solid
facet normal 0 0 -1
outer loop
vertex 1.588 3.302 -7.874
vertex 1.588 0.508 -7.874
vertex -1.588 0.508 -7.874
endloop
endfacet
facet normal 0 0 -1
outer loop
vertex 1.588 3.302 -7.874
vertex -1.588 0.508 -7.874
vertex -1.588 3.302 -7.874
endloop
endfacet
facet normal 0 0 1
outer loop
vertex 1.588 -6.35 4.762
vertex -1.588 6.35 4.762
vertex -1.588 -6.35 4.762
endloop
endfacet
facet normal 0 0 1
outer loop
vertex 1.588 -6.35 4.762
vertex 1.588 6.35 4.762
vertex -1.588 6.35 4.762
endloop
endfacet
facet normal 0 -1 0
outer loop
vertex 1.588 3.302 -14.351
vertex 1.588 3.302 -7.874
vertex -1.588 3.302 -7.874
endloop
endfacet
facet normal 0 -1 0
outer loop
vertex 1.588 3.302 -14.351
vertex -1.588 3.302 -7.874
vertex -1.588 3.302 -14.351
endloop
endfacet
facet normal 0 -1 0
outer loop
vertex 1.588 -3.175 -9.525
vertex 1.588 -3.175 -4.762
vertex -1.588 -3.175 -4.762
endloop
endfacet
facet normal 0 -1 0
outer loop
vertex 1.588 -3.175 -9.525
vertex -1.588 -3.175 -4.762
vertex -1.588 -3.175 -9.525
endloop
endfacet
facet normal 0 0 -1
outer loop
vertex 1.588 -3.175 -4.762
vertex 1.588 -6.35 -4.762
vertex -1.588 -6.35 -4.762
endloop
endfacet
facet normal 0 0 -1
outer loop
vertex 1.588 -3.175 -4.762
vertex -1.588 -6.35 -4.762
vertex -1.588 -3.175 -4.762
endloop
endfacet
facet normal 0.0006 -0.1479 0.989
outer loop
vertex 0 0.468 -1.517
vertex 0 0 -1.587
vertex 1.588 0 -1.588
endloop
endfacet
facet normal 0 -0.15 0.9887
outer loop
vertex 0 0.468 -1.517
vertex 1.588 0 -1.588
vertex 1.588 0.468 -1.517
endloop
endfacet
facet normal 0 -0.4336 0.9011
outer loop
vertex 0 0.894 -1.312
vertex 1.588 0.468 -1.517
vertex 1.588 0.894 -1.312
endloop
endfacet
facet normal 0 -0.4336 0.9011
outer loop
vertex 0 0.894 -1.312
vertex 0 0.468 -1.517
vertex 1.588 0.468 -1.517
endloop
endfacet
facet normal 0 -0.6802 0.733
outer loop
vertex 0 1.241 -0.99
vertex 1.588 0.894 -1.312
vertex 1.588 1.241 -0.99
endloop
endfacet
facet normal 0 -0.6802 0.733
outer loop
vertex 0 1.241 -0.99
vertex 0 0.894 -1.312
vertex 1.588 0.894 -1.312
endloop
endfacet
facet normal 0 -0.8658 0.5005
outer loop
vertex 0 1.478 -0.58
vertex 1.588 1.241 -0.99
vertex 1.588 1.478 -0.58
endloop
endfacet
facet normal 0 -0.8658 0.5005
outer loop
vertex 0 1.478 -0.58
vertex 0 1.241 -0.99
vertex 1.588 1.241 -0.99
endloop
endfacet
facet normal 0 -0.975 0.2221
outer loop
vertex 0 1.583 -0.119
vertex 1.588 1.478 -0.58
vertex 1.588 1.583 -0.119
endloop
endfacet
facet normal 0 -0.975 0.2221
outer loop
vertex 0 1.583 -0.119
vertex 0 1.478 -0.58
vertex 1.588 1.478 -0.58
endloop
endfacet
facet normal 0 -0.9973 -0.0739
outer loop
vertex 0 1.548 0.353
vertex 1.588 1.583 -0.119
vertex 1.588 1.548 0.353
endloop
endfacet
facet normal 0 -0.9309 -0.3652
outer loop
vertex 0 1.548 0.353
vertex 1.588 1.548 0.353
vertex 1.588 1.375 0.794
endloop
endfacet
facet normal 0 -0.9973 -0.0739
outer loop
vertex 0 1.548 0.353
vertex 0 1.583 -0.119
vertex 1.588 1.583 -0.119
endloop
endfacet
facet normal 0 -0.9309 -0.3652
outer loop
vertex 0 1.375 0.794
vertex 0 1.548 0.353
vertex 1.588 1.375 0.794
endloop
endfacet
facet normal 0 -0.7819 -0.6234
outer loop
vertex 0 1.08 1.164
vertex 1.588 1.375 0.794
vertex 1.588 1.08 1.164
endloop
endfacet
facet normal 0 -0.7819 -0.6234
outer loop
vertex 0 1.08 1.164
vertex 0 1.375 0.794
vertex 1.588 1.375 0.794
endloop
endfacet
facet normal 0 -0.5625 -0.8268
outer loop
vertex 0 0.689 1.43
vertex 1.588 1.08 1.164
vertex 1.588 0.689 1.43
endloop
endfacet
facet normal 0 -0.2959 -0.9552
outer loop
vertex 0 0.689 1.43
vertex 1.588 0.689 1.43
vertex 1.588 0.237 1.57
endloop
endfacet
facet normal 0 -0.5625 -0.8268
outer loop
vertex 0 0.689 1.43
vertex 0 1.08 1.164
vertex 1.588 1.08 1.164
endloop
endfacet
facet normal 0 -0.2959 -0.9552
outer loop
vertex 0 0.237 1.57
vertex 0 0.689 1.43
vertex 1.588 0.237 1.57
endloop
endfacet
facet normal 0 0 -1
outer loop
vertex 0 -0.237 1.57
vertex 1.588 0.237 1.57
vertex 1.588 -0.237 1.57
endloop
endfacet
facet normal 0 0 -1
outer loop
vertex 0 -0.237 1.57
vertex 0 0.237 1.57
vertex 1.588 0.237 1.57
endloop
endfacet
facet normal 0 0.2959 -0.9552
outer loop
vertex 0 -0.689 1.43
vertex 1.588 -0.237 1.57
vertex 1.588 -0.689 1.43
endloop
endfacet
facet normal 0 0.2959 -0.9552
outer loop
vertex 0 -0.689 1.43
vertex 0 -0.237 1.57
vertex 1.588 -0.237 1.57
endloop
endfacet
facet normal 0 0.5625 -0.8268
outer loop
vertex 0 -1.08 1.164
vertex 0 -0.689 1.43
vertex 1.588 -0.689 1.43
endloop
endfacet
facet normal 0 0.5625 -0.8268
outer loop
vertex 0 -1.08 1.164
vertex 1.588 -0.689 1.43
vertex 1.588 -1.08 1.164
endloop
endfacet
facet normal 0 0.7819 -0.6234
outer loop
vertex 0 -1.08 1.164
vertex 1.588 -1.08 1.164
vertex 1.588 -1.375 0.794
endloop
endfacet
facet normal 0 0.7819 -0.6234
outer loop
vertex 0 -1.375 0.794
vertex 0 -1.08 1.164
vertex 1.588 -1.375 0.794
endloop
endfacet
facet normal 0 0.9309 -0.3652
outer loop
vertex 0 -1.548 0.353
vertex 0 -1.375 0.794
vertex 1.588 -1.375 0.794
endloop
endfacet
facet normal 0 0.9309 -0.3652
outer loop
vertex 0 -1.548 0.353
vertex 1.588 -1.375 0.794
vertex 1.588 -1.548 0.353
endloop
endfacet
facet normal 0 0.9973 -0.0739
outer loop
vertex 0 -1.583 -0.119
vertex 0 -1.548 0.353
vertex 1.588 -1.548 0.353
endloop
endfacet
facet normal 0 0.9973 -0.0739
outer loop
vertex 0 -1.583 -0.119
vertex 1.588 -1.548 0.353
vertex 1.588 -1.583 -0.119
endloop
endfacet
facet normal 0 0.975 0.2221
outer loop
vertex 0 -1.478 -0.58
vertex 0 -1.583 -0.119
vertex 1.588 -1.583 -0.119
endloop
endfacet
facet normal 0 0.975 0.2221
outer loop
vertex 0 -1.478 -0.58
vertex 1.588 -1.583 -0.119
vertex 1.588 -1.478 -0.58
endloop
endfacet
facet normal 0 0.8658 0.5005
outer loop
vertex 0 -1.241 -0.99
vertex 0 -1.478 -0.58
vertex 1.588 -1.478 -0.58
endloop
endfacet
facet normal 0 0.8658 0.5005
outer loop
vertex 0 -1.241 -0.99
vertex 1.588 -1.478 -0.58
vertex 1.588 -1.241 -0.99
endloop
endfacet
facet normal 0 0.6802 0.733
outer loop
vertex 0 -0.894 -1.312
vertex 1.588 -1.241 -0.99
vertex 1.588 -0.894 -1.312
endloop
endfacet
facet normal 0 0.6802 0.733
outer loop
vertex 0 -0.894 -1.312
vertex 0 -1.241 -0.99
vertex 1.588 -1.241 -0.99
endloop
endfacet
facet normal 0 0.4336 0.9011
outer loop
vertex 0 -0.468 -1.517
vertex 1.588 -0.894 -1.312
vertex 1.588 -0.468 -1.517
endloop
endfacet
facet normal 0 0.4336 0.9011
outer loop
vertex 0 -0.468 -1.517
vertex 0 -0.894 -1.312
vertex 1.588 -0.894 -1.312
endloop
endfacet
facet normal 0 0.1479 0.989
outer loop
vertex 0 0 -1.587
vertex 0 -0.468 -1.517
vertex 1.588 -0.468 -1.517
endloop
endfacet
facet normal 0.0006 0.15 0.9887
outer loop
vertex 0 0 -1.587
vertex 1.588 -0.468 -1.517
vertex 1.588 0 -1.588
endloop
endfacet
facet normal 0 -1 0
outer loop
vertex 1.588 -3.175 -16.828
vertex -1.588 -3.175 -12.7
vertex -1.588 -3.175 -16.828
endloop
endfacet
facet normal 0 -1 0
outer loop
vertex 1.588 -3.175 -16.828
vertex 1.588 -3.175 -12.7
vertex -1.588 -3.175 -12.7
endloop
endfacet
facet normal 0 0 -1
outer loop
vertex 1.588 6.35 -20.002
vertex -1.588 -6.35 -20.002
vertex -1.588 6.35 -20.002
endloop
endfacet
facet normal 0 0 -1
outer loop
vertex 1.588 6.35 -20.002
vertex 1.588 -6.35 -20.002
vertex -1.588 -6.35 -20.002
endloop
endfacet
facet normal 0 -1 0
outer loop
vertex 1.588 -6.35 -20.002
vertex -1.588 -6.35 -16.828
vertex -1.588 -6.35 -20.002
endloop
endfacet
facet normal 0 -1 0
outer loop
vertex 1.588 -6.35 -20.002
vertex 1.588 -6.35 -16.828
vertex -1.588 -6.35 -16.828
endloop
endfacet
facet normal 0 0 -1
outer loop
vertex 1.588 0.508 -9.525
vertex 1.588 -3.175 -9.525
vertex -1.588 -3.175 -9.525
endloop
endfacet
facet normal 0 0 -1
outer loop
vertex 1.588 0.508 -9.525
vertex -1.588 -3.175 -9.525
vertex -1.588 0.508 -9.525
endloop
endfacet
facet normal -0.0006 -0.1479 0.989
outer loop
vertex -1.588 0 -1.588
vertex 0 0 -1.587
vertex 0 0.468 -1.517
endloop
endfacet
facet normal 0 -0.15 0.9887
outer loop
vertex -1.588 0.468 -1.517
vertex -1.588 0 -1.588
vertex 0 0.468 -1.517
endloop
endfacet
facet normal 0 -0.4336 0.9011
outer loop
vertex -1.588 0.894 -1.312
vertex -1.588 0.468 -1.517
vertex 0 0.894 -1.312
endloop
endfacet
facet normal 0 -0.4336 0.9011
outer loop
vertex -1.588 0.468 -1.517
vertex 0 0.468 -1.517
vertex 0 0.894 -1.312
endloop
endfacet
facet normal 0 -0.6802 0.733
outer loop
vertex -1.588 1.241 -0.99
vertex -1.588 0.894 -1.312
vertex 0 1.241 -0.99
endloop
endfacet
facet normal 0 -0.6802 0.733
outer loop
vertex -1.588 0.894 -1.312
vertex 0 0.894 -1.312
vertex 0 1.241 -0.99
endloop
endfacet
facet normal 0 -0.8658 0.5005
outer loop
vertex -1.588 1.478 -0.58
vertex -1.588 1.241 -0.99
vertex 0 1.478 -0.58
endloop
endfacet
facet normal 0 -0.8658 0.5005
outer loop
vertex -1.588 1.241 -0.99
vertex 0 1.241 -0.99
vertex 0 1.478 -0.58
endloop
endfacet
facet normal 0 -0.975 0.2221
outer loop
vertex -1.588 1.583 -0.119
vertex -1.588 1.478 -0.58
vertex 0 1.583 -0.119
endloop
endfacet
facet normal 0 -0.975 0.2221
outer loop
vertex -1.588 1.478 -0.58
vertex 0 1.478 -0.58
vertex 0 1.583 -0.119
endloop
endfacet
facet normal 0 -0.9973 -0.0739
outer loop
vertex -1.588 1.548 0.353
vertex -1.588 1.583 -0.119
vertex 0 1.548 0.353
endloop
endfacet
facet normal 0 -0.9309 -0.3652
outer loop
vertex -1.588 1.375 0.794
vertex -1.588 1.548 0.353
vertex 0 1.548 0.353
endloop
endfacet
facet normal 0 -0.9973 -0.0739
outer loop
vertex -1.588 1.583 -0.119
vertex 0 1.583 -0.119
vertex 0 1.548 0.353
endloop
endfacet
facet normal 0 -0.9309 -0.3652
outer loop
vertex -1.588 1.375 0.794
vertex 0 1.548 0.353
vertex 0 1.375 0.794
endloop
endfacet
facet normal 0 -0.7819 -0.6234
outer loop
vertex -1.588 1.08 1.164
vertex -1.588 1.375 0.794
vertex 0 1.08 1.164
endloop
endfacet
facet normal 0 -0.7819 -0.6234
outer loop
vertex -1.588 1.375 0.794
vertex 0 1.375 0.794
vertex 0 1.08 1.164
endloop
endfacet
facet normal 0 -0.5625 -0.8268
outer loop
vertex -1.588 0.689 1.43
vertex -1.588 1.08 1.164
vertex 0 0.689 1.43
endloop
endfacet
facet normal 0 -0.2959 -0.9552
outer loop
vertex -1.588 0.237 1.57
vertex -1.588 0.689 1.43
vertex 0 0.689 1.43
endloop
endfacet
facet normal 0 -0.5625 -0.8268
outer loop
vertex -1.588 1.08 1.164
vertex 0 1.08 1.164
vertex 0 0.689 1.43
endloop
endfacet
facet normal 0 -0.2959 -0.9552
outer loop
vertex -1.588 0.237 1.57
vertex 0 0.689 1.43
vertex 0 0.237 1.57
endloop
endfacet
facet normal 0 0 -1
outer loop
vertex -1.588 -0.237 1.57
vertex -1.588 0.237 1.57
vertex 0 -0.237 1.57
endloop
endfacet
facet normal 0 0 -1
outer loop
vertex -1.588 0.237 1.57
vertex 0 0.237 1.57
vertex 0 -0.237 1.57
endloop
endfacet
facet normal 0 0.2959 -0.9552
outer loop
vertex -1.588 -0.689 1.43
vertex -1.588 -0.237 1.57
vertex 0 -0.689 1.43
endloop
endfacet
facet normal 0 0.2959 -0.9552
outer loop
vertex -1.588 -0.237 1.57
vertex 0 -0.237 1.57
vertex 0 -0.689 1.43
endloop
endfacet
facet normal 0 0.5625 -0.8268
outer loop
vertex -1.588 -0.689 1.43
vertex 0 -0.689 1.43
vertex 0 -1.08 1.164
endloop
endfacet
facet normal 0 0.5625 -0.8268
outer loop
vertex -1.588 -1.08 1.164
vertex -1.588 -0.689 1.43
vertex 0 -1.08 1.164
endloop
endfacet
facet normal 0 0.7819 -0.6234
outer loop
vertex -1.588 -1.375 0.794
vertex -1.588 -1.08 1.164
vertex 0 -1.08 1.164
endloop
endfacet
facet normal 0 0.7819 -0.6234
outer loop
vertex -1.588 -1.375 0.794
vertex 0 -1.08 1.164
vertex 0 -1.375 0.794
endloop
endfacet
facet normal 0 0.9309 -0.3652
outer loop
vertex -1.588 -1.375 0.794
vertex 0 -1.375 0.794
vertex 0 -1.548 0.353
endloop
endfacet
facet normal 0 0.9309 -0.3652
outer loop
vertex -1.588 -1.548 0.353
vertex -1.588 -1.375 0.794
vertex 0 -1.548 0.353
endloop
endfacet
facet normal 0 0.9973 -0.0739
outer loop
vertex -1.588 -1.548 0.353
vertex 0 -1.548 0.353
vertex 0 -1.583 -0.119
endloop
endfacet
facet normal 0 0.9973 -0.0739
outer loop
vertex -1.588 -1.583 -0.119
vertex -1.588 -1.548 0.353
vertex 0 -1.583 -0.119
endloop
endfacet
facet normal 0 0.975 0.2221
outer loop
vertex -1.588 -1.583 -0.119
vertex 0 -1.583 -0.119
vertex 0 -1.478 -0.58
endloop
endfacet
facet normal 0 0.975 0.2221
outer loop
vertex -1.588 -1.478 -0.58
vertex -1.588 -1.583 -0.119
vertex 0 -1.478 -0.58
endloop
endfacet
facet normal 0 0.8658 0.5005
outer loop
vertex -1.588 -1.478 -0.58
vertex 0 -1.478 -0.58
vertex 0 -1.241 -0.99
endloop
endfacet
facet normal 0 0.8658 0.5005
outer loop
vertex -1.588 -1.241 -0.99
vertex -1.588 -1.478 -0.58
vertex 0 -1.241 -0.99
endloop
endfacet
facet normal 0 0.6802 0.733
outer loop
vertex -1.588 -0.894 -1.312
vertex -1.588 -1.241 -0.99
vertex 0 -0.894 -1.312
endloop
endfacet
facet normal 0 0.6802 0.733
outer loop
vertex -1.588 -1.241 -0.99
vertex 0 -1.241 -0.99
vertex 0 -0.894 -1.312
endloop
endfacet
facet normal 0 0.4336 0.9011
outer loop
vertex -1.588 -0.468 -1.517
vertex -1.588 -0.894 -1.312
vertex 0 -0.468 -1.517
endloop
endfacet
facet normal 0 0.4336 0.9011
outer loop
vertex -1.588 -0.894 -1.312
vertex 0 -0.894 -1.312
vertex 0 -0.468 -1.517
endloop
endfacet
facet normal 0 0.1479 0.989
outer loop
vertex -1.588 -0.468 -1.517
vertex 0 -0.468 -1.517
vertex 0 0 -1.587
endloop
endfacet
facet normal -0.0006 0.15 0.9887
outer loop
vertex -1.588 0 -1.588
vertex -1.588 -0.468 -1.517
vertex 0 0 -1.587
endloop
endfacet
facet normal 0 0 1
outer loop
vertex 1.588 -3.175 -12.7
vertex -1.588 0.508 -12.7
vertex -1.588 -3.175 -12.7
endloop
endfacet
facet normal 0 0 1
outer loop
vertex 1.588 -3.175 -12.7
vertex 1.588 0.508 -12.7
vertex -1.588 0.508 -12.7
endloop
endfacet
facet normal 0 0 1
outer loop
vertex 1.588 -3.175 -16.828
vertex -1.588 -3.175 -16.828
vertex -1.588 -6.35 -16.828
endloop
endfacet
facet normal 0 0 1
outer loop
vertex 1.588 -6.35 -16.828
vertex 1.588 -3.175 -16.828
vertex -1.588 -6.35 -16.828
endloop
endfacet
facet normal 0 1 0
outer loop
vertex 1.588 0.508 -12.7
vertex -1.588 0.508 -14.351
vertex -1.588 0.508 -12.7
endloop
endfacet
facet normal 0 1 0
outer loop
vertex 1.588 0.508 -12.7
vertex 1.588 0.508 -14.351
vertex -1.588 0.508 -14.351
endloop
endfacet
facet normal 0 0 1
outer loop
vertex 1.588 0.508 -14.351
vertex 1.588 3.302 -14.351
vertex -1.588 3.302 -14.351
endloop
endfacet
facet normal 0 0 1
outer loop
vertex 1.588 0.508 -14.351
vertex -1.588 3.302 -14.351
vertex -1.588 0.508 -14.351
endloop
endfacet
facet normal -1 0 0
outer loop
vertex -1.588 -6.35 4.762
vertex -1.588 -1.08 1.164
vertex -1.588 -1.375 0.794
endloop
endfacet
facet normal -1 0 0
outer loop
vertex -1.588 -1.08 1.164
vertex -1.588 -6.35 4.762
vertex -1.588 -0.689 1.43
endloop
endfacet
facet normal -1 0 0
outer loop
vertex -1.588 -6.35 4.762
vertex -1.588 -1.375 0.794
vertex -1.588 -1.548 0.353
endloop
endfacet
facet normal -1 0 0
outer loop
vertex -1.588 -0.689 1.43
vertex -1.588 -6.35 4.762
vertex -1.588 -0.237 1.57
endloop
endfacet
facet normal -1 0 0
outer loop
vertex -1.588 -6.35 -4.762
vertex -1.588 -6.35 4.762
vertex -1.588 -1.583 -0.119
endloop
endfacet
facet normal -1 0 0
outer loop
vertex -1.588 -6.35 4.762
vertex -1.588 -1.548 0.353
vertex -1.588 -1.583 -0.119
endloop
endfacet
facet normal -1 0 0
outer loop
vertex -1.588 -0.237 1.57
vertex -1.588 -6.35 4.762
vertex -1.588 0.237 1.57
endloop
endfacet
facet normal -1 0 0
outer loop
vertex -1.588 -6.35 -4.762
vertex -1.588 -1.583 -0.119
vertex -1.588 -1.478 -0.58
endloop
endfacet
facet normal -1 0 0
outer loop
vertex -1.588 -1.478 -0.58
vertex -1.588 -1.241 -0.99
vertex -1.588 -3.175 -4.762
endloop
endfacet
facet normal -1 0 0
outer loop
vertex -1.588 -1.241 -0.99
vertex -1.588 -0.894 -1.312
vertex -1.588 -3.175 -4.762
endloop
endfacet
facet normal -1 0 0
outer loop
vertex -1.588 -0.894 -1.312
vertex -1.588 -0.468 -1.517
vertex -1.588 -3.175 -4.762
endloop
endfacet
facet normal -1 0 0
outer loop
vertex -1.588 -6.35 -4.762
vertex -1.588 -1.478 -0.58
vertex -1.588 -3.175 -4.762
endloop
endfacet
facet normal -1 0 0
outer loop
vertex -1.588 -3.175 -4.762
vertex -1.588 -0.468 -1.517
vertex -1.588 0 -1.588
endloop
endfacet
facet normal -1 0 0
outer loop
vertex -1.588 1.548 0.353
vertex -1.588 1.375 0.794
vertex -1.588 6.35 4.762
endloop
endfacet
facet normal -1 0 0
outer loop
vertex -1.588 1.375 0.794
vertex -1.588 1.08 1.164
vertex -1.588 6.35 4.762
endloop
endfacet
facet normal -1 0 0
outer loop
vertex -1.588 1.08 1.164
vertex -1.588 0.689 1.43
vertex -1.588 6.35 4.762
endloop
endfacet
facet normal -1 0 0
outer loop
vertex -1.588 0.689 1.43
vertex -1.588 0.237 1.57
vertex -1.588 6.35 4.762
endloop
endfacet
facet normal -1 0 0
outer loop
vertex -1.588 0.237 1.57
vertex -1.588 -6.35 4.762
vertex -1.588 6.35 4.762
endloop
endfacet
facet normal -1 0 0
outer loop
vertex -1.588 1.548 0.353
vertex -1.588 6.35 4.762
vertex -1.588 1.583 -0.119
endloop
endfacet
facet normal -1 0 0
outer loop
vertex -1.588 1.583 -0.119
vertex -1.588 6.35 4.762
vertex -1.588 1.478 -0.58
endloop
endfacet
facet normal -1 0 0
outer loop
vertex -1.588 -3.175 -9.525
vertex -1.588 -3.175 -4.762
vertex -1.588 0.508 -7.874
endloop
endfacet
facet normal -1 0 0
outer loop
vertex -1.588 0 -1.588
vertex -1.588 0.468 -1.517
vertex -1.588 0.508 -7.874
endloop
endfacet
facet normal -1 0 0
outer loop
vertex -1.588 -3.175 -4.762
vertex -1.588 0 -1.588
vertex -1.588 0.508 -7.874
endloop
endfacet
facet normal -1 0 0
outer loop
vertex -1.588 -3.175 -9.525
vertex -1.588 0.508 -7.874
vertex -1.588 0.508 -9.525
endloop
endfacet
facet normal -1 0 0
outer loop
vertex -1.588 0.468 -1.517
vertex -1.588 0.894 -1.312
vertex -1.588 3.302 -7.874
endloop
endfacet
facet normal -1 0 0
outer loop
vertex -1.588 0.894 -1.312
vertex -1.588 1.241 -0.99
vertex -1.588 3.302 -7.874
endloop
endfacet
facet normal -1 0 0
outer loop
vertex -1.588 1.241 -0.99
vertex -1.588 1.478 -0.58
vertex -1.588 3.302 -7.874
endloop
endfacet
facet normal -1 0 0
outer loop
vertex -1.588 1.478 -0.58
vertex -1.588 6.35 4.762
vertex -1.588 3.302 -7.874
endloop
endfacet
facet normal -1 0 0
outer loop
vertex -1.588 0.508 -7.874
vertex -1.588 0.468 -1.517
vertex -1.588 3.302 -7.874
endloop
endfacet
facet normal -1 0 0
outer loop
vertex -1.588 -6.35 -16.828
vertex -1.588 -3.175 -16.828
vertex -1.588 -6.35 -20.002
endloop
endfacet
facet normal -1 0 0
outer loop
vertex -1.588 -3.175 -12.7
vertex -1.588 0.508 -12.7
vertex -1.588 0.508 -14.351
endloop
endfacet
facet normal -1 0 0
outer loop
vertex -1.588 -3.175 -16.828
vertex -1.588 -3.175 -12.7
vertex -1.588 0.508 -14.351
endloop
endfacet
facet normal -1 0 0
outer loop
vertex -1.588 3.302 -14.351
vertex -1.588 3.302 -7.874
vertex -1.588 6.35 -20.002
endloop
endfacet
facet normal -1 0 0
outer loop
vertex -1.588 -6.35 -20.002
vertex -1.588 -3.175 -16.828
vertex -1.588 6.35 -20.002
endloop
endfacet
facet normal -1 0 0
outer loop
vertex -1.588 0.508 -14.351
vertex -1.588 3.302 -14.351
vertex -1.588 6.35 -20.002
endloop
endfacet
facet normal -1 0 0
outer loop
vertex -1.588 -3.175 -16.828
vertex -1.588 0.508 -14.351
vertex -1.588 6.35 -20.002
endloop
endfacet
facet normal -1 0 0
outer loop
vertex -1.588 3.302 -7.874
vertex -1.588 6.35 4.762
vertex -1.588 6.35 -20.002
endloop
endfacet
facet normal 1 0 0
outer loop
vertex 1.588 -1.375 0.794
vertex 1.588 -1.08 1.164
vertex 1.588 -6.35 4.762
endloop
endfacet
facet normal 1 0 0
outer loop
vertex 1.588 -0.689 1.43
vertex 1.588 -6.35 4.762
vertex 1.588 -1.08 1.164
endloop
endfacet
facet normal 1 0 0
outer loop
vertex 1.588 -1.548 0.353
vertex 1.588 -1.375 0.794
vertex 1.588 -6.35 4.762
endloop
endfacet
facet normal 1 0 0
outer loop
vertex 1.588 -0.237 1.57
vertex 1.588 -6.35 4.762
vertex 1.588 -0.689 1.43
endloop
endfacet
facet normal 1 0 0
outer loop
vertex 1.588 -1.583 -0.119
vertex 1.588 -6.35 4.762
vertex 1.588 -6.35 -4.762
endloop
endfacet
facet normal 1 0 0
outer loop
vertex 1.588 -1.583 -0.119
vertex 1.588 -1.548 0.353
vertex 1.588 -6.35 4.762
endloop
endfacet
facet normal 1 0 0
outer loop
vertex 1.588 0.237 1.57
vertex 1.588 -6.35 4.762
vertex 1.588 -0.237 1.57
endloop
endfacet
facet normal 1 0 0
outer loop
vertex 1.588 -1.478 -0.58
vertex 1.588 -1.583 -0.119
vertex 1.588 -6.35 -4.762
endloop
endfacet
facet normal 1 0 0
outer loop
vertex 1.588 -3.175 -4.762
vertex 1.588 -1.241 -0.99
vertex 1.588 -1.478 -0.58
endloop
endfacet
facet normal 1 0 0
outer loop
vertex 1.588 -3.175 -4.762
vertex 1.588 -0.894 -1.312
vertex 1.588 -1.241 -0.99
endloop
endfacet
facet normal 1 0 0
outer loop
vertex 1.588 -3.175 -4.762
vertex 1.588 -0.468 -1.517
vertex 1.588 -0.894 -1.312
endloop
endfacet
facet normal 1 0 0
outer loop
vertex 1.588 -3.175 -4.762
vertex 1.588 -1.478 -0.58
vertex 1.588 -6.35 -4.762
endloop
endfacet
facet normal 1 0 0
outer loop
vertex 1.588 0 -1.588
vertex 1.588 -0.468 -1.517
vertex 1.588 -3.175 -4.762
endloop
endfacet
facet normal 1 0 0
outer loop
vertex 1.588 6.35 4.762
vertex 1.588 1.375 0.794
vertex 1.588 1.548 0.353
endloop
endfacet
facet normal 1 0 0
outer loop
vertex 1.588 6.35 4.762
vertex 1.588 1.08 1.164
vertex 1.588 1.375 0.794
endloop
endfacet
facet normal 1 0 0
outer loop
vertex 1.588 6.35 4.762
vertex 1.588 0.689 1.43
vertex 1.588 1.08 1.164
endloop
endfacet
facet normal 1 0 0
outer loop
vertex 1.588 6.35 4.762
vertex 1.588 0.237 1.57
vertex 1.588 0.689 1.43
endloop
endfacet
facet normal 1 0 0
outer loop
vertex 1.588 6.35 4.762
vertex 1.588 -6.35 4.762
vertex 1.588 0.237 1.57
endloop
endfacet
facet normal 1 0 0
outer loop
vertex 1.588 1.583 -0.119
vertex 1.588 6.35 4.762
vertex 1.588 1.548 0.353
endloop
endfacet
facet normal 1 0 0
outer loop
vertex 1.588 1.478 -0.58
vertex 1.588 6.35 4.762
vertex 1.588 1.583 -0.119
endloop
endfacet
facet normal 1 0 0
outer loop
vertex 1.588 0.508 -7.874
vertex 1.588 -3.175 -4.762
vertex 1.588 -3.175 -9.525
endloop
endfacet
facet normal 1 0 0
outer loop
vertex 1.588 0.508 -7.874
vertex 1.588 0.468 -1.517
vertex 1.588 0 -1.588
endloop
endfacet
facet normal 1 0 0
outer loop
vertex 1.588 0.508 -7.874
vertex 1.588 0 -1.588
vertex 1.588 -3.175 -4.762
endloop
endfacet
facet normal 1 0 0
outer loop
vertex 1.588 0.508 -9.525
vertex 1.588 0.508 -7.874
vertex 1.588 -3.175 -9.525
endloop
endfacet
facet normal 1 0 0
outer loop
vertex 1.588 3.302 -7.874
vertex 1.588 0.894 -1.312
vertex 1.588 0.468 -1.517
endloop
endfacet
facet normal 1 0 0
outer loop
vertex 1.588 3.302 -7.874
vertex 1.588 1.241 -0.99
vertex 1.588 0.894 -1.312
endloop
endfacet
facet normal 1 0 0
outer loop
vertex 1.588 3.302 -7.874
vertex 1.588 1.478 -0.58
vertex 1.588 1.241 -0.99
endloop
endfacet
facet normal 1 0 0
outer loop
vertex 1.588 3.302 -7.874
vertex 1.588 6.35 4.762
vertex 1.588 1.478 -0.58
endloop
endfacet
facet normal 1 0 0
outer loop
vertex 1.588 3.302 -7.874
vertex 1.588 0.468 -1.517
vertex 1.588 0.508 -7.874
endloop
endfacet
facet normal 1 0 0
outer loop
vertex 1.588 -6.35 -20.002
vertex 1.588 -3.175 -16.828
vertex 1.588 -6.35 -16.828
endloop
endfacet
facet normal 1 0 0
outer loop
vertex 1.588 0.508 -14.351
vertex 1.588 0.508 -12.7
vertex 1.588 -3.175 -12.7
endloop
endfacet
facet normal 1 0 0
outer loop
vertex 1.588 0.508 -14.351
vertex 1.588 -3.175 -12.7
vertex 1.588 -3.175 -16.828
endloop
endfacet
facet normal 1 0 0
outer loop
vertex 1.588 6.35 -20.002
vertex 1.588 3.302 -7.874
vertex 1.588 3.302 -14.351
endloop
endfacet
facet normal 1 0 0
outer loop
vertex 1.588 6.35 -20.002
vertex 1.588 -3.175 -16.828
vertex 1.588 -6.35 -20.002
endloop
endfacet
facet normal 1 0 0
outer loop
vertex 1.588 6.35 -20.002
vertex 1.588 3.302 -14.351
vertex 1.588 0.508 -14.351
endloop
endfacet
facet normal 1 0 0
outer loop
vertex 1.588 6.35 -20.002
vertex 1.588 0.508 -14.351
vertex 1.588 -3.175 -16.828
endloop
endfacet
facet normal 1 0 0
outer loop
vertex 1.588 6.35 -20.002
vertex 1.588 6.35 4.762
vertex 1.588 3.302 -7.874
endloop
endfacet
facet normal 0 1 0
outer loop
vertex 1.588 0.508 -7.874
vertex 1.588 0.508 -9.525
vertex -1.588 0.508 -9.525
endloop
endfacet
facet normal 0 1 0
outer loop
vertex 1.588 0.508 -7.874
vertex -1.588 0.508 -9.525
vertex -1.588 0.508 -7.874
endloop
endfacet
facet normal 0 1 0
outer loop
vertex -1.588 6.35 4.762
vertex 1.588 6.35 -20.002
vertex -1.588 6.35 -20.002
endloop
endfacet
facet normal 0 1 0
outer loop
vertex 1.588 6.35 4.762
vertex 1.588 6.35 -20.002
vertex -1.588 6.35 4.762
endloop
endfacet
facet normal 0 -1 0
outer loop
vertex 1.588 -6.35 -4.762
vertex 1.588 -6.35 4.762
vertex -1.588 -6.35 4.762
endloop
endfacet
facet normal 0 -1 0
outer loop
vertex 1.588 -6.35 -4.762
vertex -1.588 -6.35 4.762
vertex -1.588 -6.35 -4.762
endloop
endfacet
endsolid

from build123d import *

# Parameters (mm, degrees)
BOSS_EXTRUDE1_DEPTH      = 1.5875
BOSS_EXTRUDE1_DEPTH_BACK = 1.5875
SKETCH2_R                = 1.5875


with BuildPart() as part:
    # Sketch2 → Boss-Extrude1 (new, two sides: drawn at the far end of the back side and taken through both)
    with BuildSketch(Plane(origin=(0, 0, 0), x_dir=(0, 0, -1), z_dir=(1, 0, 0)).offset(-BOSS_EXTRUDE1_DEPTH_BACK)):
        Polygon((-4.7625, 6.35), (-4.7625, -6.35), (4.7625, -6.35), (4.7625, -3.175), (9.525, -3.175), (9.525, 0.508), (7.874, 0.508), (7.874, 3.302), (14.351, 3.302), (14.351, 0.508), (12.7, 0.508), (12.7, -3.175), (16.8275, -3.175), (16.8275, -6.35), (20.0025, -6.35), (20.0025, 6.35), align=None)
        Circle(SKETCH2_R, mode=Mode.SUBTRACT)
    extrude(amount=BOSS_EXTRUDE1_DEPTH + BOSS_EXTRUDE1_DEPTH_BACK)


solid = part.part
